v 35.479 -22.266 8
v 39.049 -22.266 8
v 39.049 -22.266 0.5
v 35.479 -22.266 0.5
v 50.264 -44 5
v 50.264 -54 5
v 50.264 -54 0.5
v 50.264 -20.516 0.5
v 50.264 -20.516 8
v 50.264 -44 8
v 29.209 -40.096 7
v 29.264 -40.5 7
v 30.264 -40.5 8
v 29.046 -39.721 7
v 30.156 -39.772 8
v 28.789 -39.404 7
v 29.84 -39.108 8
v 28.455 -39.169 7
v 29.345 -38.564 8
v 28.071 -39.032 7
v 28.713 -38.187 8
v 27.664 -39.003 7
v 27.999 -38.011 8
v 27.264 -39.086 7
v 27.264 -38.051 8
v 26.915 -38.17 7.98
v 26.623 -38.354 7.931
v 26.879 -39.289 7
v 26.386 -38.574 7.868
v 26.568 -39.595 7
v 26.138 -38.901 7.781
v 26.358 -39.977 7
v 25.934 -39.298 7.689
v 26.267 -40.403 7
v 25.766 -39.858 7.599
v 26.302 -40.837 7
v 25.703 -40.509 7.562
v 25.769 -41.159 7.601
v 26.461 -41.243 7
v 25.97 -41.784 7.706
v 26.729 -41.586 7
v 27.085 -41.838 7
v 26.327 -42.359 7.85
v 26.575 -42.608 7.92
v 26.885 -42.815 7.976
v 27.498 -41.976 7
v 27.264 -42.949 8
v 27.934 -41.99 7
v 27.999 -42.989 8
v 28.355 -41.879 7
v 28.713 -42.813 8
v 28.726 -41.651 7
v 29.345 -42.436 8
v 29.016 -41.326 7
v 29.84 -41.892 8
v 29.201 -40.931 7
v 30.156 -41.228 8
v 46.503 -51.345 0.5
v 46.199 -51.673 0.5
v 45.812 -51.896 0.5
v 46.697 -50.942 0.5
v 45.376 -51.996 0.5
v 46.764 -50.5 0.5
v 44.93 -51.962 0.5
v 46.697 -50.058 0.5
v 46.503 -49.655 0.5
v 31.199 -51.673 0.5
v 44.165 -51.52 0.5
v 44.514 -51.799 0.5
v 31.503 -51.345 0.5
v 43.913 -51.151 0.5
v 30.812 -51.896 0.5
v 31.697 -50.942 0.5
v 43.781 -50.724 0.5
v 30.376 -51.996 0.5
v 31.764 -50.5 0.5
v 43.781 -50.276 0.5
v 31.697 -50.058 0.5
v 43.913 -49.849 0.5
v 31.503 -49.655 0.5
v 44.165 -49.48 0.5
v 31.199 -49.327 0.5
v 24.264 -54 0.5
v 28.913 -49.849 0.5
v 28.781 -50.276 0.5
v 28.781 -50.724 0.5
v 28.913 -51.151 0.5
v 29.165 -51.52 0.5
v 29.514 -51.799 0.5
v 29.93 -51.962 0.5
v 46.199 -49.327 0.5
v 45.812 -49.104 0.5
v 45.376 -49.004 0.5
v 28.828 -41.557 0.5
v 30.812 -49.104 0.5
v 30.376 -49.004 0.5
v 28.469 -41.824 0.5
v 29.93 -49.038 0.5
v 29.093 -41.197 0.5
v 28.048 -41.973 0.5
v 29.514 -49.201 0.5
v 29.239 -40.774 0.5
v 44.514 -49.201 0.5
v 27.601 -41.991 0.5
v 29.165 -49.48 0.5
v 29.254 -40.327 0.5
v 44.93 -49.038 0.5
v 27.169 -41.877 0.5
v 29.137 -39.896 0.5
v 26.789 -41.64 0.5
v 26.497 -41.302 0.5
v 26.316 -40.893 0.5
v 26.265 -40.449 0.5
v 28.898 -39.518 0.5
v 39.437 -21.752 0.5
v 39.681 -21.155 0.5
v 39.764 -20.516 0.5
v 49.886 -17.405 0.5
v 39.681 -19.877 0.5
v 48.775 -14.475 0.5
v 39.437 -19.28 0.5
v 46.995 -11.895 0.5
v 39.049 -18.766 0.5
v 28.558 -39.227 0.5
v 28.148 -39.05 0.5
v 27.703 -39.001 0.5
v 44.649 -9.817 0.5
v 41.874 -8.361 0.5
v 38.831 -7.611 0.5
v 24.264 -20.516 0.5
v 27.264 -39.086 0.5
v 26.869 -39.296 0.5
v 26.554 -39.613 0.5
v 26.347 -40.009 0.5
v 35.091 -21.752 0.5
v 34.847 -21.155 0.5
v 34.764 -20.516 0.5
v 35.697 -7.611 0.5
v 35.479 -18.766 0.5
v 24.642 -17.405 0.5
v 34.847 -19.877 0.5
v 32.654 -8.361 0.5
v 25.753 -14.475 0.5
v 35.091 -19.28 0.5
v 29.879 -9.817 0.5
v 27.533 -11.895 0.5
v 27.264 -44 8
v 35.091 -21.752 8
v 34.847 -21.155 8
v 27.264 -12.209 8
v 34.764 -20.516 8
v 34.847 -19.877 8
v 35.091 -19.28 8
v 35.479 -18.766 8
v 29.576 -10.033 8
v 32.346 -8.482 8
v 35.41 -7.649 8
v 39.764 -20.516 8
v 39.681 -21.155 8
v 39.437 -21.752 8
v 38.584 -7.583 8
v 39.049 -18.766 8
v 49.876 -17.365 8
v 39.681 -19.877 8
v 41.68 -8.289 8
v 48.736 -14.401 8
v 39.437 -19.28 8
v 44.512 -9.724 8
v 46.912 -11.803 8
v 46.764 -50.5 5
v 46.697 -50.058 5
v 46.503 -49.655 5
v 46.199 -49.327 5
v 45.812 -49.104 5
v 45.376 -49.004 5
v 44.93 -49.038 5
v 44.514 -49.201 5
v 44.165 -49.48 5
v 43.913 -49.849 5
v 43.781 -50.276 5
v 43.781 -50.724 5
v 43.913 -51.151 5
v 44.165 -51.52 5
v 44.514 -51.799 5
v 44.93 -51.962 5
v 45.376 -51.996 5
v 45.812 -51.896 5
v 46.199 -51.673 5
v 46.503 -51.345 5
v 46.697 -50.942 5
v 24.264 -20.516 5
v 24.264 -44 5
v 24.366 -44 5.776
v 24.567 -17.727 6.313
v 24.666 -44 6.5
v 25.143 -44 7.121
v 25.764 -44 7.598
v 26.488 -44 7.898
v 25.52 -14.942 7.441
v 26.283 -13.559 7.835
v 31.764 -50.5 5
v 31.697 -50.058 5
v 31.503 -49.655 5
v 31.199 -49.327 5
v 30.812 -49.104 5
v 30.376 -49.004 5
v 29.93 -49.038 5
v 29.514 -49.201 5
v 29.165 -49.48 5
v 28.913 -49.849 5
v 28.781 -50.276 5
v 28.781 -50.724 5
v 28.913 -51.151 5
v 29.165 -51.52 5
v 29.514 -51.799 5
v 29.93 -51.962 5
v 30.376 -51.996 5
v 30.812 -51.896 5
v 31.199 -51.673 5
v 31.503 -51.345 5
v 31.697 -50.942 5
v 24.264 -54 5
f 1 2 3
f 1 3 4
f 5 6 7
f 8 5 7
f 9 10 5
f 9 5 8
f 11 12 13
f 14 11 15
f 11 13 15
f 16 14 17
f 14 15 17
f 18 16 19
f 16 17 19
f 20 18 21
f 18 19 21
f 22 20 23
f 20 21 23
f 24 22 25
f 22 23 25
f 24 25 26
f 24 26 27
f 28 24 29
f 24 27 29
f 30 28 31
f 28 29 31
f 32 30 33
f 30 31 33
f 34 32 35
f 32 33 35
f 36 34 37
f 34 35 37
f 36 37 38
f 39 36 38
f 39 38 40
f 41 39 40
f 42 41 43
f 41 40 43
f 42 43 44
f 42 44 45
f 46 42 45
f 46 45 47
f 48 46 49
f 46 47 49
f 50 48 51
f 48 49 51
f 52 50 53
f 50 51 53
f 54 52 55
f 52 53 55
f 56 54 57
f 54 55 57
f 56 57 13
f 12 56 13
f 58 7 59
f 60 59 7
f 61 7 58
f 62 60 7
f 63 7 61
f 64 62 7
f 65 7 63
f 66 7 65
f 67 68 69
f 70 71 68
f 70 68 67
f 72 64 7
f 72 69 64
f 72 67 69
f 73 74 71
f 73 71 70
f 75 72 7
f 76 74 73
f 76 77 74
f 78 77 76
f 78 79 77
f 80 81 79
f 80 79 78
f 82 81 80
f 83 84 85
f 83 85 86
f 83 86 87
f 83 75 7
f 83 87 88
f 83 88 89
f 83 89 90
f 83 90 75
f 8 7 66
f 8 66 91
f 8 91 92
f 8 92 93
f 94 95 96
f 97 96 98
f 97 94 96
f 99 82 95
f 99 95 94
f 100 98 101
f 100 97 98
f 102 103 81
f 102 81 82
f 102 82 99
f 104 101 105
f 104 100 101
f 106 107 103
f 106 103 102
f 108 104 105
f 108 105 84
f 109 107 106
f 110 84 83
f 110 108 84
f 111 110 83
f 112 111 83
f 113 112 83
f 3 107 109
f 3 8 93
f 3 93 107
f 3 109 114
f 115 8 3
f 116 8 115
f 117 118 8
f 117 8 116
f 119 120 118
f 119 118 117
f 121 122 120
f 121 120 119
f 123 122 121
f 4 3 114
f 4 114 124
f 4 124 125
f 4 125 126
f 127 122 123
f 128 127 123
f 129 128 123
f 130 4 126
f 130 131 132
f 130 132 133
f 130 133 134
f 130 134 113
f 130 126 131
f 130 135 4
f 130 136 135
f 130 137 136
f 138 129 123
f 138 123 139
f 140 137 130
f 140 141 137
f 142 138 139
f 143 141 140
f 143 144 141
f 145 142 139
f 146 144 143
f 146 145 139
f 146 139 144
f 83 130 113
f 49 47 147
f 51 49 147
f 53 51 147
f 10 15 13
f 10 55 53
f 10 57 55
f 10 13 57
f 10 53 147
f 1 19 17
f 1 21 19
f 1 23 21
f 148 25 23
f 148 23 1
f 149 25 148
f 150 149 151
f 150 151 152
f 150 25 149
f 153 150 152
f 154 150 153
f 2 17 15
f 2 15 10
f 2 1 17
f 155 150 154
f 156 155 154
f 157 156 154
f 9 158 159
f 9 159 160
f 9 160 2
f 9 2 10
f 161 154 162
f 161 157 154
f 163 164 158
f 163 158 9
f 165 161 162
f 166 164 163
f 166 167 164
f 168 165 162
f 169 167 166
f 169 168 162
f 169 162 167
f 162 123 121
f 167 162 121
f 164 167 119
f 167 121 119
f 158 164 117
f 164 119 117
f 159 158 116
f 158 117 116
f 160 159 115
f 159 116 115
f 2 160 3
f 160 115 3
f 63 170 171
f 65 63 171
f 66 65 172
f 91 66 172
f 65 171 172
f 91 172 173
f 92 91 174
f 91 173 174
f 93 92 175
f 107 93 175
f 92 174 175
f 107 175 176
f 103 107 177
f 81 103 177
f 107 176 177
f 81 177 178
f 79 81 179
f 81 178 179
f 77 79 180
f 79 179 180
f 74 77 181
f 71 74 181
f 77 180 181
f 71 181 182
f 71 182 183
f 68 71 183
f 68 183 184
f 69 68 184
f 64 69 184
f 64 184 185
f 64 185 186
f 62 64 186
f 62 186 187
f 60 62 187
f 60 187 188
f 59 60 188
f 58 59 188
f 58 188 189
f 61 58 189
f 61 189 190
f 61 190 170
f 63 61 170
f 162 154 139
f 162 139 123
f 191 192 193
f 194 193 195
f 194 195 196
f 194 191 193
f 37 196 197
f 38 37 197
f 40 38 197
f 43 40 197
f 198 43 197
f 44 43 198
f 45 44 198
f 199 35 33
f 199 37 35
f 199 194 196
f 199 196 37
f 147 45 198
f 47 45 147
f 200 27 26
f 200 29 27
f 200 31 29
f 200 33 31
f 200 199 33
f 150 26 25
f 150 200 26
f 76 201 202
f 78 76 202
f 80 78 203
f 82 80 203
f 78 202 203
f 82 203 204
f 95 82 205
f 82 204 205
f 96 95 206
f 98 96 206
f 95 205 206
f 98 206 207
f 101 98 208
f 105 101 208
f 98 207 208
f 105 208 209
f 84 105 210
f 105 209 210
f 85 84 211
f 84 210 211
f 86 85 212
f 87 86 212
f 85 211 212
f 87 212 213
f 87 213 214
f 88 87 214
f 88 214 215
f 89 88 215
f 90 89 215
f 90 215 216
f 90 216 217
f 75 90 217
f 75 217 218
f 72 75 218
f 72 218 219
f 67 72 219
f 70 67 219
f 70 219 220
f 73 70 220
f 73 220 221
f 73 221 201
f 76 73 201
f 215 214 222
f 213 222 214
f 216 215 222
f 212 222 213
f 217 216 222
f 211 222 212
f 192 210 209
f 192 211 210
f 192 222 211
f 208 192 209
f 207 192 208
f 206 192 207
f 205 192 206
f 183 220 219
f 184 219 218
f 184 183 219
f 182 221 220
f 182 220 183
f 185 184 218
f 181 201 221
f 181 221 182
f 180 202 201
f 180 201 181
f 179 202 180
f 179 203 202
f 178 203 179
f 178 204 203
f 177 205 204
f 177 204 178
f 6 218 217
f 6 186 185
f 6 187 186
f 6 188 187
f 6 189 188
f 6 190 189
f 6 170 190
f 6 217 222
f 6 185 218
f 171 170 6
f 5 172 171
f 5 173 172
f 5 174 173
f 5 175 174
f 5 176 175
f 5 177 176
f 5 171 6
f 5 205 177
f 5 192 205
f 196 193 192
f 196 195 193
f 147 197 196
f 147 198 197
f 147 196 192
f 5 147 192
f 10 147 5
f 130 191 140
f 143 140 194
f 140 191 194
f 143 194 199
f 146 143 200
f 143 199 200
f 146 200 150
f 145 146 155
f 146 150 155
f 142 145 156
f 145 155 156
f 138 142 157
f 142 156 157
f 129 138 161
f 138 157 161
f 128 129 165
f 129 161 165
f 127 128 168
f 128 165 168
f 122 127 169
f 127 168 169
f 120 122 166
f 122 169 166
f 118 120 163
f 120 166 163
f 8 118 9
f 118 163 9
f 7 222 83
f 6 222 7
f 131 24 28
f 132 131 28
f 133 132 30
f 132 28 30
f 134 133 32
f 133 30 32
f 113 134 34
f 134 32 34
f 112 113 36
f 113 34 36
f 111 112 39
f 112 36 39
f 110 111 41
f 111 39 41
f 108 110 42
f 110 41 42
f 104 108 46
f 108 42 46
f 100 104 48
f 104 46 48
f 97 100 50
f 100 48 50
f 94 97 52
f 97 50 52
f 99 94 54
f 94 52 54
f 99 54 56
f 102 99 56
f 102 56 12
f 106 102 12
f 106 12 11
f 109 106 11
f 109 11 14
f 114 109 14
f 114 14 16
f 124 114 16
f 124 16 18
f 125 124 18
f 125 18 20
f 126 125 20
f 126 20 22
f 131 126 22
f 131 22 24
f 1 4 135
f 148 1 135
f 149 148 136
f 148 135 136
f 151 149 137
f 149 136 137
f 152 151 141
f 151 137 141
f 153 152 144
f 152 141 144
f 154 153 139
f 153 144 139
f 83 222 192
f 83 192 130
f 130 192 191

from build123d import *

# Parameters (mm, degrees)
SKETCH1_W           = 26
SKETCH1_H           = 50
BOSS_EXTRUDE1_DEPTH = 8
SKETCH2_W           = 26
SKETCH2_H           = 50
BOSS_EXTRUDE2_DEPTH = 8
SKETCH3_W           = 26
SKETCH3_H           = 7
BOSS_EXTRUDE3_DEPTH = 36
SKETCH4_R           = 8
SKETCH4_R_2         = 5
BOSS_EXTRUDE4_DEPTH = 10
FILLET2_R           = 3
SKETCH6_W           = 7
SKETCH6_H           = 17
BOSS_EXTRUDE5_DEPTH = 20
CHAMFER1_SIZE       = 2
CUT_EXTRUDE2_DEPTH  = 0.5
CUT_EXTRUDE3_DEPTH  = 0.5
CUT_EXTRUDE4_REACH  = 90.986
SKETCH11_W          = 26
SKETCH11_H          = 10
CUT_EXTRUDE5_DEPTH  = 3
SKETCH12_W          = 26
SKETCH12_H          = 10
CUT_EXTRUDE6_DEPTH  = 3
CUT_EXTRUDE7_REACH  = 90.986
SKETCH13_R          = 1.5
SKETCH14_W          = 39.670907723
SKETCH14_H          = 70.738486061
CUT_EXTRUDE8_DEPTH  = 8
SKETCH15_W          = 26
SKETCH15_H          = 39.127202372
CUT_EXTRUDE9_DEPTH  = 28.5


with BuildPart() as part:
    # Sketch1 → Boss-Extrude1 (new body)
    with BuildSketch(Plane.XY):
        with Locations((37.264100782, -29)):
            Rectangle(SKETCH1_W, SKETCH1_H)
        with BuildLine():
            Line((39.049457889, -22.265997948), (35.478743675, -22.265997948))
            ThreePointArc((35.478743675, -22.265997948), (34.764100782, -20.515997948), (35.478743675, -18.765997947))
            Line((35.478743675, -18.765997947), (39.049457889, -18.765997947))
            ThreePointArc((39.049457889, -18.765997947), (39.764100782, -20.515997948), (39.049457889, -22.265997948))
        make_face(mode=Mode.SUBTRACT)
    extrude(amount=BOSS_EXTRUDE1_DEPTH)



with BuildPart() as body_2:
    # Sketch2 → Boss-Extrude2 (new body)
    with BuildSketch(Plane(origin=(0, 0, -20), x_dir=(-1, 0, 0), z_dir=(0, 0, -1))):
        with Locations((-37.264100782, -29)):
            Rectangle(SKETCH2_W, SKETCH2_H)
        with BuildLine():
            Line((-39.049457889, -18.765997947), (-35.478743675, -18.765997947))
            ThreePointArc((-35.478743675, -18.765997947), (-34.764100782, -20.515997948), (-35.478743675, -22.265997948))
            Line((-35.478743675, -22.265997948), (-39.049457889, -22.265997948))
            ThreePointArc((-39.049457889, -22.265997948), (-39.764100782, -20.515997948), (-39.049457889, -18.765997947))
        make_face(mode=Mode.SUBTRACT)
    extrude(amount=BOSS_EXTRUDE2_DEPTH)


with BuildPart() as part_1:
    add(part.part)

    add(body_2.part)  # Boss-Extrude3 merges body 2
    # Sketch3 → Boss-Extrude3 (add)
    with BuildSketch(Plane.XY.offset(8)):
        with Locations((37.264100782, -50.5)):
            Rectangle(SKETCH3_W, SKETCH3_H)
    extrude(amount=-BOSS_EXTRUDE3_DEPTH)

    # Sketch4 → Boss-Extrude4 (add)
    with BuildSketch(Plane.XZ.offset(54)):
        with Locations(Location((37.264100782, -10, 0), (0, 0, 90))):
            Circle(SKETCH4_R)
        with Locations(Location((37.264100782, -10, 0), (0, 0, 270))):
            Circle(SKETCH4_R_2, mode=Mode.SUBTRACT)
    extrude(amount=BOSS_EXTRUDE4_DEPTH)

    # Fillet2
    fillet2_edges = [part_1.edges().sort_by_distance(p)[0] for p in [
        (24.264100782, -29, 8),
        (24.264100782, -29, -28),
    ]]
    fillet(fillet2_edges, radius=FILLET2_R)

    # Sketch6 → Boss-Extrude5 (add)
    with BuildSketch(Plane.XY.offset(-20)):
        with Locations((27.764100782, -45.5)):
            Rectangle(SKETCH6_W, SKETCH6_H)
    extrude(amount=BOSS_EXTRUDE5_DEPTH)

    # Chamfer1
    chamfer1_edges = [part_1.edges().sort_by_distance(p)[0] for p in [
        (37.264100782, -54, -18),
    ]]
    chamfer(chamfer1_edges, length=CHAMFER1_SIZE)

    # Sketch7 → Cut-Extrude2 (cut)
    with BuildSketch(Plane(origin=(0, 0, 0), x_dir=(-1, 0, 0), z_dir=(0, 0, -1))):
        Polygon((-50.264100782, -4), (-50.264100782, -47), (-31.264100782, -47), (-31.264100782, -37), (-24.264100782, -37), (-24.264100782, -4), align=None)
    extrude(amount=-CUT_EXTRUDE2_DEPTH, mode=Mode.SUBTRACT)

    # Sketch8 → Cut-Extrude3 (cut)
    with BuildSketch(Plane.XY.offset(-20)):
        Polygon((50.264100782, -47), (50.264100782, -4), (24.264100782, -4), (24.264100782, -37), (31.264100782, -37), (31.264100782, -47), align=None)
    extrude(amount=-CUT_EXTRUDE3_DEPTH, mode=Mode.SUBTRACT)

    # Cut-Extrude4: up to this face of the body (flat: up to its plane)
    cut_extrude4_end = Plane(part_1.part.faces().sort_by_distance((38.785185957, -29.119257779, -28))[0])
    # Sketch10 → Cut-Extrude4 (cut, up to the picked face)
    with BuildSketch(Plane.XY.offset(8), mode=Mode.PRIVATE) as cut_extrude4_sk1:
        with BuildLine():
            Line((50.264100782, -20.515997948), (50.264100782, 2.26582648))
            Line((50.264100782, 2.26582648), (24.264100782, 2.26582648))
            Line((24.264100782, 2.26582648), (24.264100782, -20.515997948))
            ThreePointArc((24.264100782, -20.515997948), (37.264100782, -7.515997948), (50.264100782, -20.515997948))
        make_face()
    cut_extrude4_tool1 = split(extrude(cut_extrude4_sk1.sketch, amount=-CUT_EXTRUDE4_REACH, mode=Mode.PRIVATE), bisect_by=cut_extrude4_end, keep=Keep.BOTH, mode=Mode.PRIVATE)
    add(cut_extrude4_tool1.solids().sort_by(Axis((37.264101, -4.354837, 8), (0, 0, -1)))[0], mode=Mode.SUBTRACT)

    # Sketch11 → Cut-Extrude5 (cut)
    with BuildSketch(Plane.XY.offset(8)):
        with Locations((37.264100782, -49)):
            Rectangle(SKETCH11_W, SKETCH11_H)
    extrude(amount=-CUT_EXTRUDE5_DEPTH, mode=Mode.SUBTRACT)

    # Sketch12 → Cut-Extrude6 (cut)
    with BuildSketch(Plane(origin=(0, 0, -28), x_dir=(-1, 0, 0), z_dir=(0, 0, -1))):
        with Locations((-37.264100782, -49)):
            Rectangle(SKETCH12_W, SKETCH12_H)
    extrude(amount=-CUT_EXTRUDE6_DEPTH, mode=Mode.SUBTRACT)

    # Cut-Extrude7: up to this face of the body (flat: up to its plane)
    cut_extrude7_end = Plane(part_1.part.faces().sort_by_distance((38.560022368, -26.898937337, -28))[0])
    # Sketch13 → Cut-Extrude7 (cut, up to the picked face)
    with BuildSketch(Plane.XY.offset(8), mode=Mode.PRIVATE) as cut_extrude7_sk1:
        with Locations((45.264100782, -50.5)):
            Circle(SKETCH13_R)
    cut_extrude7_tool1 = split(extrude(cut_extrude7_sk1.sketch, amount=-CUT_EXTRUDE7_REACH, mode=Mode.PRIVATE), bisect_by=cut_extrude7_end, keep=Keep.BOTH, mode=Mode.PRIVATE)
    # Sketch13 → Cut-Extrude7 (cut, up to the picked face)
    with BuildSketch(Plane.XY.offset(8), mode=Mode.PRIVATE) as cut_extrude7_sk2:
        with Locations((30.264100782, -50.5)):
            Circle(SKETCH13_R)
    cut_extrude7_tool2 = split(extrude(cut_extrude7_sk2.sketch, amount=-CUT_EXTRUDE7_REACH, mode=Mode.PRIVATE), bisect_by=cut_extrude7_end, keep=Keep.BOTH, mode=Mode.PRIVATE)
    # Sketch13 → Cut-Extrude7 (cut, up to the picked face)
    with BuildSketch(Plane.XY.offset(8), mode=Mode.PRIVATE) as cut_extrude7_sk3:
        with Locations(Location((27.764100782, -40.5, 0), (0, 0, 109.471220634))):
            Circle(SKETCH13_R)
    cut_extrude7_tool3 = split(extrude(cut_extrude7_sk3.sketch, amount=-CUT_EXTRUDE7_REACH, mode=Mode.PRIVATE), bisect_by=cut_extrude7_end, keep=Keep.BOTH, mode=Mode.PRIVATE)
    add(cut_extrude7_tool1.solids().sort_by(Axis((45.264101, -50.5, 8), (0, 0, -1)))[0], mode=Mode.SUBTRACT)
    add(cut_extrude7_tool2.solids().sort_by(Axis((30.264101, -50.5, 8), (0, 0, -1)))[0], mode=Mode.SUBTRACT)
    add(cut_extrude7_tool3.solids().sort_by(Axis((27.764101, -40.5, 8), (0, 0, -1)))[0], mode=Mode.SUBTRACT)

    # Sketch14 → Cut-Extrude8 (cut)
    with BuildSketch(Plane(origin=(0, 0, -28), x_dir=(-1, 0, 0), z_dir=(0, 0, -1))):
        with Locations((-35.76618016, -37.229796089)):
            Rectangle(SKETCH14_W, SKETCH14_H)
    extrude(amount=-CUT_EXTRUDE8_DEPTH, mode=Mode.SUBTRACT)

    # Chamfer2: read off the stored shape, not the designer's step
    # Chamfer2 outline → Chamfer2 (revolve, cut)
    with BuildSketch(Plane(origin=(27.764100782, -40.5, 0), x_dir=(1, 0, 0), z_dir=(0, -1, 0))):
        Polygon((1.5, 8.000002987), (1.5, 7), (2.500002987, 8.000002987), align=None)
    revolve(axis=Axis((27.764100782, -40.5, 0), (0, 0, 1)), mode=Mode.SUBTRACT)

    # Sketch15 → Cut-Extrude9 (cut)
    with BuildSketch(Plane(origin=(0, 0, 0.5), x_dir=(-1, 0, 0), z_dir=(0, 0, -1))):
        with Locations((-37.264100782, -56.563601186)):
            Rectangle(SKETCH15_W, SKETCH15_H)
    extrude(amount=CUT_EXTRUDE9_DEPTH, mode=Mode.SUBTRACT)


solid = part_1.part
